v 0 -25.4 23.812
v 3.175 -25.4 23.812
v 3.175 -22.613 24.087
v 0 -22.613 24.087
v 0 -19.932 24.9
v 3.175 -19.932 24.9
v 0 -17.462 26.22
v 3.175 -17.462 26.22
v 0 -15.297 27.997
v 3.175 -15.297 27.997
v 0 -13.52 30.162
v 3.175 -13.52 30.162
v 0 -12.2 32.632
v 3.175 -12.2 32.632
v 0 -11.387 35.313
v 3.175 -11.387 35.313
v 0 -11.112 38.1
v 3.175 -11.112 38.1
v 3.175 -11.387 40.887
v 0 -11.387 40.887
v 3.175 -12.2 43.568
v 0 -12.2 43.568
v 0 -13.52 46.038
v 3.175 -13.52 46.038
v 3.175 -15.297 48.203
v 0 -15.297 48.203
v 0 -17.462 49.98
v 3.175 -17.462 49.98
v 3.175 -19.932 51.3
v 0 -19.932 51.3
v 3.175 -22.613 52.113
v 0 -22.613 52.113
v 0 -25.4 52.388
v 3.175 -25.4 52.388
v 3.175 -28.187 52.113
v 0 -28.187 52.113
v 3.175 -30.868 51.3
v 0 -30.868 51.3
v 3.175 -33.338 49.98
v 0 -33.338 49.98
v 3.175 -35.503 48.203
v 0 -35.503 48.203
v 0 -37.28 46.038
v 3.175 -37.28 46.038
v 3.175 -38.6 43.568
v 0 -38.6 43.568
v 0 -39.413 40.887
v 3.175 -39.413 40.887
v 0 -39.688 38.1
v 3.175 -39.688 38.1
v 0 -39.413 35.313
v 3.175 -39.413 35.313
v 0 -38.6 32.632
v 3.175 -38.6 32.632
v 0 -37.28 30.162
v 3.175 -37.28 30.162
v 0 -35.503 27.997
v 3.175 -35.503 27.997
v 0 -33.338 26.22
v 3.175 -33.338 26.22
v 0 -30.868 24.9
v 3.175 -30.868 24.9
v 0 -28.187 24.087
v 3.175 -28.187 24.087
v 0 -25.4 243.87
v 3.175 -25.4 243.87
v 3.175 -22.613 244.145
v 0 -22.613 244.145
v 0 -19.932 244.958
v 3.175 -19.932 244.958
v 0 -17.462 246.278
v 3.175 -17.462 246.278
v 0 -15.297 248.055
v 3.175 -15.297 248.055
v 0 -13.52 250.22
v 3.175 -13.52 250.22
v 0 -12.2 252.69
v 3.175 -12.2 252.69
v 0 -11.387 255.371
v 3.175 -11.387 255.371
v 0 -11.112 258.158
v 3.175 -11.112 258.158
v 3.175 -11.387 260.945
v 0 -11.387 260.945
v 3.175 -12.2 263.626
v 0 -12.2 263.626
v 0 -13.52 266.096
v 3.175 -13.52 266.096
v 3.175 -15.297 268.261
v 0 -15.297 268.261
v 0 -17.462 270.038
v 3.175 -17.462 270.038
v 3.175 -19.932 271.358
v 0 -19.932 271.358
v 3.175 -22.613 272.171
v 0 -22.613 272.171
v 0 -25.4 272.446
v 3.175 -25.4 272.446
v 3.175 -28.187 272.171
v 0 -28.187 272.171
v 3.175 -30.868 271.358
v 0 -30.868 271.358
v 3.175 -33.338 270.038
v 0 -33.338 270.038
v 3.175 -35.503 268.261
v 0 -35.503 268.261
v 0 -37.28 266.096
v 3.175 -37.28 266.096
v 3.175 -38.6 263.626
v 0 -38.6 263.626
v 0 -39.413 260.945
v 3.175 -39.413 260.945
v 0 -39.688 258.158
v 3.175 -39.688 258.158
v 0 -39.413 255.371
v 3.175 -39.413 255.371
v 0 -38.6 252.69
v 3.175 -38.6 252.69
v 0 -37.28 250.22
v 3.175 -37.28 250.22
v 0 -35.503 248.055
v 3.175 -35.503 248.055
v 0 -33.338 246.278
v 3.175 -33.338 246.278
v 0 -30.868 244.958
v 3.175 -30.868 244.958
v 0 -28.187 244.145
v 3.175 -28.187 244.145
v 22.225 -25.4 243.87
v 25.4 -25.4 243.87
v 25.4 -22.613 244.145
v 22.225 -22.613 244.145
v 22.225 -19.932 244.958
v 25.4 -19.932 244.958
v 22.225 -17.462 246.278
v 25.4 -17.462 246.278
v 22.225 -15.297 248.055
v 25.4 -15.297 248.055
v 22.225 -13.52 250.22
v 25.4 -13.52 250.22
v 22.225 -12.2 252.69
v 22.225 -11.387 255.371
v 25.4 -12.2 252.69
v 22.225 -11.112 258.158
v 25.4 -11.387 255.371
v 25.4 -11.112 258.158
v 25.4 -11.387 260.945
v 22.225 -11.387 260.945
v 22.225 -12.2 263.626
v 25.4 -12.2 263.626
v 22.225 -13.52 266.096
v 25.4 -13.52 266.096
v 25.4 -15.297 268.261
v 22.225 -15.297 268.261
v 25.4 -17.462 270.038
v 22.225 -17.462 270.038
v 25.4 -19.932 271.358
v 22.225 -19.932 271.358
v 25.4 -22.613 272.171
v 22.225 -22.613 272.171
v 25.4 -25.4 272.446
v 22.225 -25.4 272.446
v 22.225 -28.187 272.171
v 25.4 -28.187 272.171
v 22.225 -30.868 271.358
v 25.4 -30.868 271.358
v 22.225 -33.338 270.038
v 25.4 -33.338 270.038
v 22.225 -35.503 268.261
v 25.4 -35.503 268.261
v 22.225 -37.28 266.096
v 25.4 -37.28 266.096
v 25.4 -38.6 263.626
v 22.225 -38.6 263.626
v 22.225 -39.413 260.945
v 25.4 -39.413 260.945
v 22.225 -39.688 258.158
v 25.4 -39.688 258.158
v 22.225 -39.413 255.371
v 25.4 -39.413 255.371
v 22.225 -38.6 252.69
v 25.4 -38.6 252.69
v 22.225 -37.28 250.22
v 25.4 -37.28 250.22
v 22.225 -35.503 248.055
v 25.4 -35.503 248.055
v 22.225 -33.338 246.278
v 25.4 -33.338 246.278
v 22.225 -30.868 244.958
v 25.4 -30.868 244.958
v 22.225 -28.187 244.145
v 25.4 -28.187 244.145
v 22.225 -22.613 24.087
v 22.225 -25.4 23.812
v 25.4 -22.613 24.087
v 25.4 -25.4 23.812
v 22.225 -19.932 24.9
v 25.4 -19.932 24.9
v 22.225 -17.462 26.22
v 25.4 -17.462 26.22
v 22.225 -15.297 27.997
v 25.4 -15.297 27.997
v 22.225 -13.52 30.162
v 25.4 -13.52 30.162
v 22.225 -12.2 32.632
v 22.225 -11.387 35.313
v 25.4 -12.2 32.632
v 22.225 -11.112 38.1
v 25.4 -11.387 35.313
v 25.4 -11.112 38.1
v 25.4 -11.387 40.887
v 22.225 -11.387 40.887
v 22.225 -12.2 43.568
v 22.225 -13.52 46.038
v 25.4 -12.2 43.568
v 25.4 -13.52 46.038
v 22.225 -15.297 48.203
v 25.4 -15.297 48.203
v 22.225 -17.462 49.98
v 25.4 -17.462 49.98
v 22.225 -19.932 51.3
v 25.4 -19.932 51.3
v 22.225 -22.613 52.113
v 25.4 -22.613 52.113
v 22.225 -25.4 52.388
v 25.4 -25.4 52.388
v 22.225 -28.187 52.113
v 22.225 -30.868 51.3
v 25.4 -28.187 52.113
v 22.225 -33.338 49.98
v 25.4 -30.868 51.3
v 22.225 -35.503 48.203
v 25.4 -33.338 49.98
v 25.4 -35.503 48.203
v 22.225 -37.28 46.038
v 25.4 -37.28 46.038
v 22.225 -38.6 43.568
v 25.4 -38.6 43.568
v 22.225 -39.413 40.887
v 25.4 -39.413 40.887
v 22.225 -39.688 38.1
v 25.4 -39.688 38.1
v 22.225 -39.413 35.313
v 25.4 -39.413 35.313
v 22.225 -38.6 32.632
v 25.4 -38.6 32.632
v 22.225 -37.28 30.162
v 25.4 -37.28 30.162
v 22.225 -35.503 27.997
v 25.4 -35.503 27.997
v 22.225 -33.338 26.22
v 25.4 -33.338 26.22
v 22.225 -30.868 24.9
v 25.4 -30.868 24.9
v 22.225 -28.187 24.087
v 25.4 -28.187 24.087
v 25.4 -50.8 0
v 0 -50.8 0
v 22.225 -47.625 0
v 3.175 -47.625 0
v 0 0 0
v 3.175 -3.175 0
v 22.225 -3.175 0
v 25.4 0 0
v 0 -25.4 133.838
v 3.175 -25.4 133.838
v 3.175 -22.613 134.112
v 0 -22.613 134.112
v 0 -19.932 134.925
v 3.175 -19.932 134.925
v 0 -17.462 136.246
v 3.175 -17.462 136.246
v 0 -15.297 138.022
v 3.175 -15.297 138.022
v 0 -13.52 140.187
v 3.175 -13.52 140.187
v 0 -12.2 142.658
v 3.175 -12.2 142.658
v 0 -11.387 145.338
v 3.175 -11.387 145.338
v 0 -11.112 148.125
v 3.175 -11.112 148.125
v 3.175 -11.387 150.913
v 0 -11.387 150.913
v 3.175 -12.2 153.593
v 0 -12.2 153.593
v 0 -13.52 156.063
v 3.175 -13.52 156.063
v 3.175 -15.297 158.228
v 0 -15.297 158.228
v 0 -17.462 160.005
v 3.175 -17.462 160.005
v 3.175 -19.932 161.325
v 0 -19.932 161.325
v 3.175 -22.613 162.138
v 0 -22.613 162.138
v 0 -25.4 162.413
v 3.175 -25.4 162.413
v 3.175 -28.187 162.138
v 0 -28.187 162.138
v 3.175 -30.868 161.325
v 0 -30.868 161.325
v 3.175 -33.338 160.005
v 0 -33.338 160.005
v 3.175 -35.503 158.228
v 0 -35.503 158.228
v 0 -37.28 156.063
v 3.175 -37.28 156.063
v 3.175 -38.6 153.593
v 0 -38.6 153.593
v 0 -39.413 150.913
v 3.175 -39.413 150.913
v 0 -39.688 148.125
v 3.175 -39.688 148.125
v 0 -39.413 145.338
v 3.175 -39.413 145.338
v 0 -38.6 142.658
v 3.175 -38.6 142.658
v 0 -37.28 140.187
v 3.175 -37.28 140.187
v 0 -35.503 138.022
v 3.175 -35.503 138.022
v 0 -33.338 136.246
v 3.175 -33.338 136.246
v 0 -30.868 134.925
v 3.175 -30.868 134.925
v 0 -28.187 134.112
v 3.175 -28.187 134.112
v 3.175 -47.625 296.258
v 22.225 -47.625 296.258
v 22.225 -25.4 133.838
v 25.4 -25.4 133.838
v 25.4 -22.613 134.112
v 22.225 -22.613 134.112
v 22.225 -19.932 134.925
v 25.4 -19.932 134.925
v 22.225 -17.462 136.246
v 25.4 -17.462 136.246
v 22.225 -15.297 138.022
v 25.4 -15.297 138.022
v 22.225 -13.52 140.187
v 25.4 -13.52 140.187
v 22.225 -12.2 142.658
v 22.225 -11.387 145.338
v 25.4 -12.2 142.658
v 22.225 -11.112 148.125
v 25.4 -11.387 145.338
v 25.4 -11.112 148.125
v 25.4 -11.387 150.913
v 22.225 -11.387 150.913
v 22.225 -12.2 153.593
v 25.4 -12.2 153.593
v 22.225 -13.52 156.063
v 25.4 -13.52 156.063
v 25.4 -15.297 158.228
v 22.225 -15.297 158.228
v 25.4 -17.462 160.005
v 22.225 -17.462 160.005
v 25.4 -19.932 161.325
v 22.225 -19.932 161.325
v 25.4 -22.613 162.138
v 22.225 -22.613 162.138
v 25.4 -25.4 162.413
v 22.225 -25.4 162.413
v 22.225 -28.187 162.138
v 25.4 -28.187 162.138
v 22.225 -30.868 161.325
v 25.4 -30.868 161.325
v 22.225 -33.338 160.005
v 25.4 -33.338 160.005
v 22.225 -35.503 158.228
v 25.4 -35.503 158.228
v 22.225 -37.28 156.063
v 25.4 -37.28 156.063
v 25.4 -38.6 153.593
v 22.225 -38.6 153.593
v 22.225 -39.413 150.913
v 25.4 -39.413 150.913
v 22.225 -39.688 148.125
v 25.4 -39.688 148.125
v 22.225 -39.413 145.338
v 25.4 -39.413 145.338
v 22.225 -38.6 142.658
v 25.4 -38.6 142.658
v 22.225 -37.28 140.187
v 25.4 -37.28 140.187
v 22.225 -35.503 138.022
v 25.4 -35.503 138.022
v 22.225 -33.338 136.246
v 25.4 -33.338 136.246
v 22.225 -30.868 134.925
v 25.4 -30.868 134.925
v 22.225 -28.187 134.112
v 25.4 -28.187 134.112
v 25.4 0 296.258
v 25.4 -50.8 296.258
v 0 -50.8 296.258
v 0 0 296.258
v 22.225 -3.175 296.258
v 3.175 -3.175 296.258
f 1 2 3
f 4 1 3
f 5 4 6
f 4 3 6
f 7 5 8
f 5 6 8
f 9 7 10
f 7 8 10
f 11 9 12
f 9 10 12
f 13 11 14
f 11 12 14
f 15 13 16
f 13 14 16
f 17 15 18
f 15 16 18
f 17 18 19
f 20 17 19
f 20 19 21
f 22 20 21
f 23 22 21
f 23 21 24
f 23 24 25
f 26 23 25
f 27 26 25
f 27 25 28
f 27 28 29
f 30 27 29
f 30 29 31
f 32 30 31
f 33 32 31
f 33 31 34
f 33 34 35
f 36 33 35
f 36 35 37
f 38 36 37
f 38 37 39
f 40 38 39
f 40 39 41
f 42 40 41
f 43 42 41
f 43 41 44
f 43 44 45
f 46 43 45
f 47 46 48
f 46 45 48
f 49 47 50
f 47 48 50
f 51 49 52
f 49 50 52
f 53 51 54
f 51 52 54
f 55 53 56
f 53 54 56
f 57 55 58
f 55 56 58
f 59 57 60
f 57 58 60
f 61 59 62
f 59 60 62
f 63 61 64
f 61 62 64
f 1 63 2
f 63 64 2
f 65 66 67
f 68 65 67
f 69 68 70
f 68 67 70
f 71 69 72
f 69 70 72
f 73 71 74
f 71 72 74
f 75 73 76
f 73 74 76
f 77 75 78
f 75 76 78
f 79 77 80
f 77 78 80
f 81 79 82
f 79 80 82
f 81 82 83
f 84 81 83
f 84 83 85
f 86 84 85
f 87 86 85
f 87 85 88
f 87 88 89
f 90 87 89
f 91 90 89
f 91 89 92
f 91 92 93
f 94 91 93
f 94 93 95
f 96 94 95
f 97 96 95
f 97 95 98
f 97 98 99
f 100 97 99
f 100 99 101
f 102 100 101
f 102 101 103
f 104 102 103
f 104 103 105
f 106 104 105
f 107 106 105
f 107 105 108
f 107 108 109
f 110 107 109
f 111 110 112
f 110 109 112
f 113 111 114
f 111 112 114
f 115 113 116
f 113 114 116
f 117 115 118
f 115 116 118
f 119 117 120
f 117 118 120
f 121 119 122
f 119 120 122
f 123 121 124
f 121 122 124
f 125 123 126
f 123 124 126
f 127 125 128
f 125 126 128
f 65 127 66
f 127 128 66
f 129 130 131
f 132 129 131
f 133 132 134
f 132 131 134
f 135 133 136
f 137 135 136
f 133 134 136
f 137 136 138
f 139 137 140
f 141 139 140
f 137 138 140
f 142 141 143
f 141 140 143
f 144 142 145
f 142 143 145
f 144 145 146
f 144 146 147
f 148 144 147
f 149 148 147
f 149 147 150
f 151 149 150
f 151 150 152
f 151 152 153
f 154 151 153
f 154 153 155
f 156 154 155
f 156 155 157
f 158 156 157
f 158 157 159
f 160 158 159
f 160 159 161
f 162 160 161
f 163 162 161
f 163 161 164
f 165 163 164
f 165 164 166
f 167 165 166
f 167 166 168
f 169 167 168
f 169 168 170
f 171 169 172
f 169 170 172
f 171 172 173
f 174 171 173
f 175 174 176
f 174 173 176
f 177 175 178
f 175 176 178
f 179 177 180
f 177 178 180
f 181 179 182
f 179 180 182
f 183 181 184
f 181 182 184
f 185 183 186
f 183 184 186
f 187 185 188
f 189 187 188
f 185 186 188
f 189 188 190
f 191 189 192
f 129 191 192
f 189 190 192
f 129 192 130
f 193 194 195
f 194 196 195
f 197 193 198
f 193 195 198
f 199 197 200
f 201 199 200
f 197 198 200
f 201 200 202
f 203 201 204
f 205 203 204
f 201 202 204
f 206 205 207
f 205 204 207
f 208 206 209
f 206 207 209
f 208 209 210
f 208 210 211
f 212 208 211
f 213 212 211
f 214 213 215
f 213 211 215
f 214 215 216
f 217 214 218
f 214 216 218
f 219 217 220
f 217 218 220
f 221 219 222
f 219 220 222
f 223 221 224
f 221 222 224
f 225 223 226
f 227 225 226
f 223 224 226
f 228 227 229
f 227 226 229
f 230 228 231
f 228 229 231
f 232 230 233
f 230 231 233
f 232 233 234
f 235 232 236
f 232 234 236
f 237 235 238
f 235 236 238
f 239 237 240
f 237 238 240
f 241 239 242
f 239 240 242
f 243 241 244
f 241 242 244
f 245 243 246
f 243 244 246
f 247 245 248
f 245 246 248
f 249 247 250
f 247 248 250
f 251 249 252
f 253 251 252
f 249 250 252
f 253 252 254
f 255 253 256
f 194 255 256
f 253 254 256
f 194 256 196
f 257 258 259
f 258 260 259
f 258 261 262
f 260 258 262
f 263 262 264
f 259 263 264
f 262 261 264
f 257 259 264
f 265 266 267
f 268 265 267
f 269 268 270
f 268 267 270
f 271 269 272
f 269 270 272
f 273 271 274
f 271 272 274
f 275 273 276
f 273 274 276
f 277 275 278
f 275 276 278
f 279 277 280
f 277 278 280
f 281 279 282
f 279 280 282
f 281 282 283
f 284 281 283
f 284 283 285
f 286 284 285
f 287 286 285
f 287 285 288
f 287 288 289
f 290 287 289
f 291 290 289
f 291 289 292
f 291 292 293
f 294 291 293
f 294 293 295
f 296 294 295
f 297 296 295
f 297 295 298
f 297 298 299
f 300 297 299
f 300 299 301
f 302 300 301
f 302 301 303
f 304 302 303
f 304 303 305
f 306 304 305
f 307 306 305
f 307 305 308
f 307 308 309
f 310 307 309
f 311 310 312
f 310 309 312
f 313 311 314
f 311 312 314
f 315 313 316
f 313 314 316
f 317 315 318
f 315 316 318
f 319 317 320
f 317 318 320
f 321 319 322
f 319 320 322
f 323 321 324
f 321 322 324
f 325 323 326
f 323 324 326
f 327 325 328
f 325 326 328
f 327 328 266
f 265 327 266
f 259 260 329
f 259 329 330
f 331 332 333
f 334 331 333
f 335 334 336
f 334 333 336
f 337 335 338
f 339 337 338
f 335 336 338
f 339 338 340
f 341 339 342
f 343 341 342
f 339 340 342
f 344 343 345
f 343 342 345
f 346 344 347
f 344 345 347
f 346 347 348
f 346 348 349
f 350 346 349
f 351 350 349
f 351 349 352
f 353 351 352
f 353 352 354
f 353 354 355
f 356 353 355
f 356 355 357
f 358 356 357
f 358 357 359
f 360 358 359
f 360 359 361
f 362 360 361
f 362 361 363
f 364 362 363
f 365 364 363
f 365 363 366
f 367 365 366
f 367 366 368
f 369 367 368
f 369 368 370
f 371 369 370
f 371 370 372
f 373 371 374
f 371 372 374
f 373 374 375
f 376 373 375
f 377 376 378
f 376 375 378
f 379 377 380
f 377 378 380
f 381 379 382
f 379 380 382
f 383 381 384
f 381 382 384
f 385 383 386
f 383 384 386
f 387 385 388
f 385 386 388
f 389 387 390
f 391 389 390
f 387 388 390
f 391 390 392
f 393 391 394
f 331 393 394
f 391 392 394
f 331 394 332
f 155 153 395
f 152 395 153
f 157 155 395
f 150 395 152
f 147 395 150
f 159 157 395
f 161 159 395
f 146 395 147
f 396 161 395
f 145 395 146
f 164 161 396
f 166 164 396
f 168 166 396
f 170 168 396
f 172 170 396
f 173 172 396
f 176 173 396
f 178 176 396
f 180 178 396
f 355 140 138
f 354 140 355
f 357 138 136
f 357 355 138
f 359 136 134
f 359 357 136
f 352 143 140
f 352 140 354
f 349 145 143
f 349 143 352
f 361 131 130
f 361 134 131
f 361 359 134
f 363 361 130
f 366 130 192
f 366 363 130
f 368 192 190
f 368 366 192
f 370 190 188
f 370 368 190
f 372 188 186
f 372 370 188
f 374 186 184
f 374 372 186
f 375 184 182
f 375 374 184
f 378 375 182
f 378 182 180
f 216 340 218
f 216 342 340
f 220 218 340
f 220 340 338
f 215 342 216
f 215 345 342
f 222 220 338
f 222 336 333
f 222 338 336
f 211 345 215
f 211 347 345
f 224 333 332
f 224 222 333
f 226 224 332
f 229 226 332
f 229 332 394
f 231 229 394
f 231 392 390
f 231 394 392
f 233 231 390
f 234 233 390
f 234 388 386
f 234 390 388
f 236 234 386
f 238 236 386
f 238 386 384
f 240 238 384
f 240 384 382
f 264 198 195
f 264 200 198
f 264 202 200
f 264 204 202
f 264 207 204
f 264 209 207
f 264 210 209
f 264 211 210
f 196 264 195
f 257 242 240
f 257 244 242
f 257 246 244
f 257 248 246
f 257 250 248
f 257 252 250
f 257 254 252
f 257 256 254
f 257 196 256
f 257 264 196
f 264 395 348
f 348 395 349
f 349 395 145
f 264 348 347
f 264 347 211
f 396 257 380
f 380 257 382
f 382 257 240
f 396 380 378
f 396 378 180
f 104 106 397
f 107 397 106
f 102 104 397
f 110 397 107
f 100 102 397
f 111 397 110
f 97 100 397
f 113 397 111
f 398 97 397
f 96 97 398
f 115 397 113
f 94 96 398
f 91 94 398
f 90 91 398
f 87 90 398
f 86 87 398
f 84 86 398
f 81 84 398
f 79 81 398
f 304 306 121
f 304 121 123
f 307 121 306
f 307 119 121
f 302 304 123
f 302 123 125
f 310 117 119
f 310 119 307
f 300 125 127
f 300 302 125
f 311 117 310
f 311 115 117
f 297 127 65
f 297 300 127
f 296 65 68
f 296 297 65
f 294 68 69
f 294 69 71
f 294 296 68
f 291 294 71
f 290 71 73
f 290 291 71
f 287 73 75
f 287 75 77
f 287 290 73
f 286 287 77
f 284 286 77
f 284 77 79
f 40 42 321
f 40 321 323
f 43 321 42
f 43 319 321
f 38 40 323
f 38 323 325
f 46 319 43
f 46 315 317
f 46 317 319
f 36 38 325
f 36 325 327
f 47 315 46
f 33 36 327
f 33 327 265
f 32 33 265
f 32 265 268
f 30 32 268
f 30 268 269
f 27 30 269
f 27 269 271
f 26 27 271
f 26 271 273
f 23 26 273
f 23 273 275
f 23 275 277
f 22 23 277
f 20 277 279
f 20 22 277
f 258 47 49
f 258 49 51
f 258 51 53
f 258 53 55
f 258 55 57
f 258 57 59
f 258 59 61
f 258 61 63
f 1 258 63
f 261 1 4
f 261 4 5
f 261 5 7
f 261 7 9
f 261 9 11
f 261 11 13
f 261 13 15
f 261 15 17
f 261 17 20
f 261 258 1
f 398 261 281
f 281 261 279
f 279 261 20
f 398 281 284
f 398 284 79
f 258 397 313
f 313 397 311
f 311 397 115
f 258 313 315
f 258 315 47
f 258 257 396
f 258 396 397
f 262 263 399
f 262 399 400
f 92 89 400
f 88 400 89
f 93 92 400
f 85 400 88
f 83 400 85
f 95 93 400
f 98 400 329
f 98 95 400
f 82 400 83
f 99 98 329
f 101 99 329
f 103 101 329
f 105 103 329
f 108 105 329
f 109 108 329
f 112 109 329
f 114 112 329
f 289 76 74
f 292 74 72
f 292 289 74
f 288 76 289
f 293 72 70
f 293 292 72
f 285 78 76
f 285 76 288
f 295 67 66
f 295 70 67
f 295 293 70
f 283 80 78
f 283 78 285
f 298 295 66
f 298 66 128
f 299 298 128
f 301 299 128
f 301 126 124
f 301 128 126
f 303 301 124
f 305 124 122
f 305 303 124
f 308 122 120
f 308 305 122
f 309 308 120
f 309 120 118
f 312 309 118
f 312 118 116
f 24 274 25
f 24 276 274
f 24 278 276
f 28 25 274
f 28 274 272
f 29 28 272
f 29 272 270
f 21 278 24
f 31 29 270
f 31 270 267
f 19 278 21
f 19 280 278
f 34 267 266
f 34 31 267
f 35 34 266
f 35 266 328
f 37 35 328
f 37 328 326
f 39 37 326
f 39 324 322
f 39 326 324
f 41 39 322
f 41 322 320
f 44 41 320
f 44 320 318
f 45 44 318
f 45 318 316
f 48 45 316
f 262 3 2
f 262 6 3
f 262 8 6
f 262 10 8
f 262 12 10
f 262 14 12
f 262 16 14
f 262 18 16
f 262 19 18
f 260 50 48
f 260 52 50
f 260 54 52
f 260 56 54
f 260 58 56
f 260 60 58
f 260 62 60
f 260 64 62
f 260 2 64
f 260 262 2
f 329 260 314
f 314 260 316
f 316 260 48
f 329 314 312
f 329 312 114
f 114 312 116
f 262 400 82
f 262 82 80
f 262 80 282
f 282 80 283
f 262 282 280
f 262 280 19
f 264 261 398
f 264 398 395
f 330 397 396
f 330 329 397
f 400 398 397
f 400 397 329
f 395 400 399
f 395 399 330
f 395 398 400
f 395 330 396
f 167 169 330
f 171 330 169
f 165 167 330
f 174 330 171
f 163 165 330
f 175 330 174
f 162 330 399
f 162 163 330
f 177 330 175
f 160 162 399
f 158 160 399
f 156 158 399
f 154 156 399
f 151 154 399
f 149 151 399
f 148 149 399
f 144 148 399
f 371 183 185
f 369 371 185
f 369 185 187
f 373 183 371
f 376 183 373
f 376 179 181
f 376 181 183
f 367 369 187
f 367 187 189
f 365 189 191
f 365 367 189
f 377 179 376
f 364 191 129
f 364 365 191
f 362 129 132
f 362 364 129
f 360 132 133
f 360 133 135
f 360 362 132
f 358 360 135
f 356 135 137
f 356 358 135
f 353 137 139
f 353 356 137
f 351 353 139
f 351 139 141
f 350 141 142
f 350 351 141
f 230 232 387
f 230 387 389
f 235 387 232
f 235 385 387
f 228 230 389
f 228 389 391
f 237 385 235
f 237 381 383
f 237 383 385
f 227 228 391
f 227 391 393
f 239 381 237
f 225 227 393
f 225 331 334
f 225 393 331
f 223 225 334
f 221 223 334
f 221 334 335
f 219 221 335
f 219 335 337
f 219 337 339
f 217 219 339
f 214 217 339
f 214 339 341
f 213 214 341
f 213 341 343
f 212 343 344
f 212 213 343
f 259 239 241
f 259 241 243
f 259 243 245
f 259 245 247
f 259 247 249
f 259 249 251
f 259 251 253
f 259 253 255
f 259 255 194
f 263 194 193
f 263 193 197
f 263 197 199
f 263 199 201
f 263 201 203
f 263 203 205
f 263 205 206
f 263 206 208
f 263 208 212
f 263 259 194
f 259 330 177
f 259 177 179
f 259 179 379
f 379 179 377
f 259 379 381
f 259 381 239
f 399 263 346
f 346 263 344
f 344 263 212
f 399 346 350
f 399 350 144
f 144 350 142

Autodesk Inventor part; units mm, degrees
ref_plane "YZ Plane" through (0, 0, 0) normal (1, 0, 0) x (0, 1, 0)
ref_plane "XZ Plane" through (0, 0, 0) normal (0, 1, 0) x (-1, 0, 0)
ref_plane "XY Plane" through (0, 0, 0) normal (0, 0, 1) x (1, 0, 0)
sketch "Sketch1" plane through (0, 0, 0) normal (0, 0, 1) x (1, 0, 0)
  line L0 (0, 0) -> (25.4, 0)
  line L1 (25.4, 0) -> (25.4, -50.8)
  line L2 (25.4, -50.8) -> (0, -50.8)
  line L3 (0, -50.8) -> (0, 0)
  line L4 (22.225, -3.175) -> (3.175, -3.175)
  line L5 (3.175, -3.175) -> (3.175, -47.625)
  line L6 (3.175, -47.625) -> (22.225, -47.625)
  line L7 (22.225, -47.625) -> (22.225, -3.175)
  dimension "d0" = 25.4
  dimension "d1" = 50.8
  dimension "d2" = 3.175
extrude "Extrusion1" add sketch "Sketch1" along normal blind 296.258
sketch "Sketch2" plane through (25.4, -50.8, 0) normal (1, 0, 0) x (0, 0, -1)
  circle A0 centre (-38.1, 25.4) radius 14.2875
  circle A1 centre (-148.1252, 25.4) radius 14.2875
  line L0 (0, 50.8) -> (0, 0) projected
  line L1 (-296.258, 0) -> (-296.258, 50.8) projected
  line L2 (0, 0) -> (-296.258, 0) projected
  dimension "d5" = 38.1
  dimension "d6" = 110.0252
  dimension "d7" = 148.1328
  dimension "d8" = 25.4
  dimension "d9" = 25.4
  dimension "d10" = 28.575
  dimension "d11" = 28.575
extrude "Extrusion2" cut sketch "Sketch2" against normal blind 190.5
sketch "Sketch3" plane through (25.4, -50.8, 0) normal (1, 0, 0) x (0, 0, -1)
  circle A0 centre (-258.158, 25.4) radius 14.2875
  line L0 (-296.258, 0) -> (-296.258, 50.8) projected
  line L1 (0, 50.8) -> (-296.258, 50.8) projected
  circle A1 centre (-148.1252, 25.4) radius 14.2875 projected
  dimension "d14" = 38.1
  dimension "d15" = 28.575
  dimension "d16" = 25.4
  dimension "d19" = 110.0328
extrude "Extrusion3" cut sketch "Sketch3" against normal blind 25.4 contours A0
properties part number "DRL SS"
